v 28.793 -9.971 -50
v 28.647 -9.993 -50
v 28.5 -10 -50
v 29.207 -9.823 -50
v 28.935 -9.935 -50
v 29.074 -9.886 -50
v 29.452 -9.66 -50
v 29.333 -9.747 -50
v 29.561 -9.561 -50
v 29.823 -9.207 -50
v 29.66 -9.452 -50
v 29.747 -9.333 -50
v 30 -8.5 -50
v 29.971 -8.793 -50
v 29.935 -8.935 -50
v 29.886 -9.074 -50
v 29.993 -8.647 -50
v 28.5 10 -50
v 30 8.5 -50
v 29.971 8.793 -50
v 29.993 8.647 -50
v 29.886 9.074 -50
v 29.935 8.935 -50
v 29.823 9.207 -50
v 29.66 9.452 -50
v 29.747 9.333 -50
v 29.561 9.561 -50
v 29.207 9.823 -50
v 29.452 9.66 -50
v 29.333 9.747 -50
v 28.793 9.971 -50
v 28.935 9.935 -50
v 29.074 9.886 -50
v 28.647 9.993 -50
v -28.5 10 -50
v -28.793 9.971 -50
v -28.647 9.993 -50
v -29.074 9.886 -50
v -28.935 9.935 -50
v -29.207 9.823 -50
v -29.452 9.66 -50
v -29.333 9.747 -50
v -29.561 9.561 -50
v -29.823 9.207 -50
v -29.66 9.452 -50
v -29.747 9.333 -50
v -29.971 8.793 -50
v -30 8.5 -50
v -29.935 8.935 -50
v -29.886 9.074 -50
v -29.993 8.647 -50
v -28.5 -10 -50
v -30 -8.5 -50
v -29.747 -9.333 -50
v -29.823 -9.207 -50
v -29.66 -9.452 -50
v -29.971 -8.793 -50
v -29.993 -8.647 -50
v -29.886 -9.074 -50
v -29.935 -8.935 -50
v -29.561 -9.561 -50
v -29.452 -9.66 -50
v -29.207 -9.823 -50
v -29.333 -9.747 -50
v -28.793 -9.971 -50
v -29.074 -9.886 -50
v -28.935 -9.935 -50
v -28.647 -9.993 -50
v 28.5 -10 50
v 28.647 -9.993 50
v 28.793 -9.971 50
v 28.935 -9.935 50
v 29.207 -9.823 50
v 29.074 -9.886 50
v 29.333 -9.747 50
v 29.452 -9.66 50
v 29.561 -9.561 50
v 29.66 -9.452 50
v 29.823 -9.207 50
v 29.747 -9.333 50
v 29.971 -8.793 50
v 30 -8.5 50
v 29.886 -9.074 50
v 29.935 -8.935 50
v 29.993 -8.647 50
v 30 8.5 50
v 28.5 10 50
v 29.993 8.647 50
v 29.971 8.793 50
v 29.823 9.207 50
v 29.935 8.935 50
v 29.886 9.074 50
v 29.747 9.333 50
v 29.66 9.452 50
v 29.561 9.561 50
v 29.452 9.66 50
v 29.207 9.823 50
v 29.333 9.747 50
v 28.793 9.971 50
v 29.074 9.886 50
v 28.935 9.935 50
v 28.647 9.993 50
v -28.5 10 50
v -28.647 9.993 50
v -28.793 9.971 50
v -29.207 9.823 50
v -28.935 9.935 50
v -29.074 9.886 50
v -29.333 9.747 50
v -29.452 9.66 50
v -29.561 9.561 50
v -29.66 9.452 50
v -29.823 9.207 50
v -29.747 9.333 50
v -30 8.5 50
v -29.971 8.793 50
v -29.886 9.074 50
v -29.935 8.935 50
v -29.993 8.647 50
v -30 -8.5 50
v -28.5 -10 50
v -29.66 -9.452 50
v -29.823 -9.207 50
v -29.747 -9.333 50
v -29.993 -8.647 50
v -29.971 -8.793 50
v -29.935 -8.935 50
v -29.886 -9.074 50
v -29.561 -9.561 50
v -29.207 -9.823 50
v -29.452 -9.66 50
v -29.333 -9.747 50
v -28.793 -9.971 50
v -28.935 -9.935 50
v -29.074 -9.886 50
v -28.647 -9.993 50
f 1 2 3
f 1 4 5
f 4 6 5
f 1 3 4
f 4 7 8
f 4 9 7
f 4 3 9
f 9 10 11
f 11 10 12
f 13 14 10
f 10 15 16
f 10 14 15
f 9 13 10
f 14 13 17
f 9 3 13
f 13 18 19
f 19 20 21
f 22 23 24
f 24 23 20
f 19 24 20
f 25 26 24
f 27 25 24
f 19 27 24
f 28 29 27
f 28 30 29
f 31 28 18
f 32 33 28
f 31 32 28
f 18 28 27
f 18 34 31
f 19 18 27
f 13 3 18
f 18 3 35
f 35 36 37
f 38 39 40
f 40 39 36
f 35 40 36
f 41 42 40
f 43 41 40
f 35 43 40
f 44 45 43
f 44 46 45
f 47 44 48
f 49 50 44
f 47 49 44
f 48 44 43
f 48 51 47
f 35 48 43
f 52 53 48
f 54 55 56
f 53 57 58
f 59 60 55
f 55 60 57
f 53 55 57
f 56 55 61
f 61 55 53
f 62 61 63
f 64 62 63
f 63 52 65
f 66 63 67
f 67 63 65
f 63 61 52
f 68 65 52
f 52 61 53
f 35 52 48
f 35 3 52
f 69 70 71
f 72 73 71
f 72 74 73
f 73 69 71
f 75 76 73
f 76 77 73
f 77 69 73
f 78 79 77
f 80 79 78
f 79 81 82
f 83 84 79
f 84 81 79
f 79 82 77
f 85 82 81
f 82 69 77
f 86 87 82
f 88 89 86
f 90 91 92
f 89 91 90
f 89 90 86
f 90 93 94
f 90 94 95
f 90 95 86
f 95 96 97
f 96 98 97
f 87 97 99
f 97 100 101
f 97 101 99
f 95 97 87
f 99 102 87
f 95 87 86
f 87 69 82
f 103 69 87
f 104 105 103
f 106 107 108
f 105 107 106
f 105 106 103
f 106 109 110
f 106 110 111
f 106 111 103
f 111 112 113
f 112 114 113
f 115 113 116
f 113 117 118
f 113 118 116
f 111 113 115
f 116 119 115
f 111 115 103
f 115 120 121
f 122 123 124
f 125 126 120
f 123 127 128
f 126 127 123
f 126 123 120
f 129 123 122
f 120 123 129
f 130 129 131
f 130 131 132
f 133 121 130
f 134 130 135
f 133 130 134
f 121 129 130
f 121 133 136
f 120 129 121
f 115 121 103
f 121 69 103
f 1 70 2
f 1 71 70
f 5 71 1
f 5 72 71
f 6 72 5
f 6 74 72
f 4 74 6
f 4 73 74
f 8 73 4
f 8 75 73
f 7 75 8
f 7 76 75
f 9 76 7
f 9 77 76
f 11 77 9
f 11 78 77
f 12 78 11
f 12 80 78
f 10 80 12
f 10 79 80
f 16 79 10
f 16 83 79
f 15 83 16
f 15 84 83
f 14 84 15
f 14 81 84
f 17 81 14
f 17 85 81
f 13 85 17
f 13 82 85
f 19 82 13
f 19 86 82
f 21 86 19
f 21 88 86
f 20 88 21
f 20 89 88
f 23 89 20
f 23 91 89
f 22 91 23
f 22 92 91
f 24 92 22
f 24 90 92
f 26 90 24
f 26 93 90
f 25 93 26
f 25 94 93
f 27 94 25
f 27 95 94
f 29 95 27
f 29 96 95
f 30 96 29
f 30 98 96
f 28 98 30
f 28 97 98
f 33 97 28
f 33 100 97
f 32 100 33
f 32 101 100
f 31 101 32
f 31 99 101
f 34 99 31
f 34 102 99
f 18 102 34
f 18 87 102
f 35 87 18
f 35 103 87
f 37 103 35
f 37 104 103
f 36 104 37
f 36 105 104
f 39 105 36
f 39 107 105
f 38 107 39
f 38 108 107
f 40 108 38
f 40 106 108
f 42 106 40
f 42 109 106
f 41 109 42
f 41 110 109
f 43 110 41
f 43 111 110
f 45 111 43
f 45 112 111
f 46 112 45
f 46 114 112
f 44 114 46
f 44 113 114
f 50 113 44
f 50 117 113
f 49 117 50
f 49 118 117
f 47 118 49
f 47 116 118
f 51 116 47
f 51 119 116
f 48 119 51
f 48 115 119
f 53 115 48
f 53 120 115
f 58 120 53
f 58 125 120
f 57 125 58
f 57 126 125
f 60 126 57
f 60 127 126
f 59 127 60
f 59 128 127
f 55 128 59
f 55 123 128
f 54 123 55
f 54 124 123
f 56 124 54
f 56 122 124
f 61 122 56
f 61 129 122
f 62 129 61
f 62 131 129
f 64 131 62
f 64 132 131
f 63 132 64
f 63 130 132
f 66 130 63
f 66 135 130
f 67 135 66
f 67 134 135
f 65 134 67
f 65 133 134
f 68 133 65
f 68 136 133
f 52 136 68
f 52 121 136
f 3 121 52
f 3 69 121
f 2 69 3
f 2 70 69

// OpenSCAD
$fn=64;

module tslot_2060_profile(len=100, w=60, h=20, corner_r=1.5) {
    linear_extrude(height=len, center=true, convexity=10)
        offset(r=corner_r)
            offset(delta=-corner_r)
                square([w, h], center=true);
}

tslot_2060_profile(len=100, w=60, h=20, corner_r=1.5);
